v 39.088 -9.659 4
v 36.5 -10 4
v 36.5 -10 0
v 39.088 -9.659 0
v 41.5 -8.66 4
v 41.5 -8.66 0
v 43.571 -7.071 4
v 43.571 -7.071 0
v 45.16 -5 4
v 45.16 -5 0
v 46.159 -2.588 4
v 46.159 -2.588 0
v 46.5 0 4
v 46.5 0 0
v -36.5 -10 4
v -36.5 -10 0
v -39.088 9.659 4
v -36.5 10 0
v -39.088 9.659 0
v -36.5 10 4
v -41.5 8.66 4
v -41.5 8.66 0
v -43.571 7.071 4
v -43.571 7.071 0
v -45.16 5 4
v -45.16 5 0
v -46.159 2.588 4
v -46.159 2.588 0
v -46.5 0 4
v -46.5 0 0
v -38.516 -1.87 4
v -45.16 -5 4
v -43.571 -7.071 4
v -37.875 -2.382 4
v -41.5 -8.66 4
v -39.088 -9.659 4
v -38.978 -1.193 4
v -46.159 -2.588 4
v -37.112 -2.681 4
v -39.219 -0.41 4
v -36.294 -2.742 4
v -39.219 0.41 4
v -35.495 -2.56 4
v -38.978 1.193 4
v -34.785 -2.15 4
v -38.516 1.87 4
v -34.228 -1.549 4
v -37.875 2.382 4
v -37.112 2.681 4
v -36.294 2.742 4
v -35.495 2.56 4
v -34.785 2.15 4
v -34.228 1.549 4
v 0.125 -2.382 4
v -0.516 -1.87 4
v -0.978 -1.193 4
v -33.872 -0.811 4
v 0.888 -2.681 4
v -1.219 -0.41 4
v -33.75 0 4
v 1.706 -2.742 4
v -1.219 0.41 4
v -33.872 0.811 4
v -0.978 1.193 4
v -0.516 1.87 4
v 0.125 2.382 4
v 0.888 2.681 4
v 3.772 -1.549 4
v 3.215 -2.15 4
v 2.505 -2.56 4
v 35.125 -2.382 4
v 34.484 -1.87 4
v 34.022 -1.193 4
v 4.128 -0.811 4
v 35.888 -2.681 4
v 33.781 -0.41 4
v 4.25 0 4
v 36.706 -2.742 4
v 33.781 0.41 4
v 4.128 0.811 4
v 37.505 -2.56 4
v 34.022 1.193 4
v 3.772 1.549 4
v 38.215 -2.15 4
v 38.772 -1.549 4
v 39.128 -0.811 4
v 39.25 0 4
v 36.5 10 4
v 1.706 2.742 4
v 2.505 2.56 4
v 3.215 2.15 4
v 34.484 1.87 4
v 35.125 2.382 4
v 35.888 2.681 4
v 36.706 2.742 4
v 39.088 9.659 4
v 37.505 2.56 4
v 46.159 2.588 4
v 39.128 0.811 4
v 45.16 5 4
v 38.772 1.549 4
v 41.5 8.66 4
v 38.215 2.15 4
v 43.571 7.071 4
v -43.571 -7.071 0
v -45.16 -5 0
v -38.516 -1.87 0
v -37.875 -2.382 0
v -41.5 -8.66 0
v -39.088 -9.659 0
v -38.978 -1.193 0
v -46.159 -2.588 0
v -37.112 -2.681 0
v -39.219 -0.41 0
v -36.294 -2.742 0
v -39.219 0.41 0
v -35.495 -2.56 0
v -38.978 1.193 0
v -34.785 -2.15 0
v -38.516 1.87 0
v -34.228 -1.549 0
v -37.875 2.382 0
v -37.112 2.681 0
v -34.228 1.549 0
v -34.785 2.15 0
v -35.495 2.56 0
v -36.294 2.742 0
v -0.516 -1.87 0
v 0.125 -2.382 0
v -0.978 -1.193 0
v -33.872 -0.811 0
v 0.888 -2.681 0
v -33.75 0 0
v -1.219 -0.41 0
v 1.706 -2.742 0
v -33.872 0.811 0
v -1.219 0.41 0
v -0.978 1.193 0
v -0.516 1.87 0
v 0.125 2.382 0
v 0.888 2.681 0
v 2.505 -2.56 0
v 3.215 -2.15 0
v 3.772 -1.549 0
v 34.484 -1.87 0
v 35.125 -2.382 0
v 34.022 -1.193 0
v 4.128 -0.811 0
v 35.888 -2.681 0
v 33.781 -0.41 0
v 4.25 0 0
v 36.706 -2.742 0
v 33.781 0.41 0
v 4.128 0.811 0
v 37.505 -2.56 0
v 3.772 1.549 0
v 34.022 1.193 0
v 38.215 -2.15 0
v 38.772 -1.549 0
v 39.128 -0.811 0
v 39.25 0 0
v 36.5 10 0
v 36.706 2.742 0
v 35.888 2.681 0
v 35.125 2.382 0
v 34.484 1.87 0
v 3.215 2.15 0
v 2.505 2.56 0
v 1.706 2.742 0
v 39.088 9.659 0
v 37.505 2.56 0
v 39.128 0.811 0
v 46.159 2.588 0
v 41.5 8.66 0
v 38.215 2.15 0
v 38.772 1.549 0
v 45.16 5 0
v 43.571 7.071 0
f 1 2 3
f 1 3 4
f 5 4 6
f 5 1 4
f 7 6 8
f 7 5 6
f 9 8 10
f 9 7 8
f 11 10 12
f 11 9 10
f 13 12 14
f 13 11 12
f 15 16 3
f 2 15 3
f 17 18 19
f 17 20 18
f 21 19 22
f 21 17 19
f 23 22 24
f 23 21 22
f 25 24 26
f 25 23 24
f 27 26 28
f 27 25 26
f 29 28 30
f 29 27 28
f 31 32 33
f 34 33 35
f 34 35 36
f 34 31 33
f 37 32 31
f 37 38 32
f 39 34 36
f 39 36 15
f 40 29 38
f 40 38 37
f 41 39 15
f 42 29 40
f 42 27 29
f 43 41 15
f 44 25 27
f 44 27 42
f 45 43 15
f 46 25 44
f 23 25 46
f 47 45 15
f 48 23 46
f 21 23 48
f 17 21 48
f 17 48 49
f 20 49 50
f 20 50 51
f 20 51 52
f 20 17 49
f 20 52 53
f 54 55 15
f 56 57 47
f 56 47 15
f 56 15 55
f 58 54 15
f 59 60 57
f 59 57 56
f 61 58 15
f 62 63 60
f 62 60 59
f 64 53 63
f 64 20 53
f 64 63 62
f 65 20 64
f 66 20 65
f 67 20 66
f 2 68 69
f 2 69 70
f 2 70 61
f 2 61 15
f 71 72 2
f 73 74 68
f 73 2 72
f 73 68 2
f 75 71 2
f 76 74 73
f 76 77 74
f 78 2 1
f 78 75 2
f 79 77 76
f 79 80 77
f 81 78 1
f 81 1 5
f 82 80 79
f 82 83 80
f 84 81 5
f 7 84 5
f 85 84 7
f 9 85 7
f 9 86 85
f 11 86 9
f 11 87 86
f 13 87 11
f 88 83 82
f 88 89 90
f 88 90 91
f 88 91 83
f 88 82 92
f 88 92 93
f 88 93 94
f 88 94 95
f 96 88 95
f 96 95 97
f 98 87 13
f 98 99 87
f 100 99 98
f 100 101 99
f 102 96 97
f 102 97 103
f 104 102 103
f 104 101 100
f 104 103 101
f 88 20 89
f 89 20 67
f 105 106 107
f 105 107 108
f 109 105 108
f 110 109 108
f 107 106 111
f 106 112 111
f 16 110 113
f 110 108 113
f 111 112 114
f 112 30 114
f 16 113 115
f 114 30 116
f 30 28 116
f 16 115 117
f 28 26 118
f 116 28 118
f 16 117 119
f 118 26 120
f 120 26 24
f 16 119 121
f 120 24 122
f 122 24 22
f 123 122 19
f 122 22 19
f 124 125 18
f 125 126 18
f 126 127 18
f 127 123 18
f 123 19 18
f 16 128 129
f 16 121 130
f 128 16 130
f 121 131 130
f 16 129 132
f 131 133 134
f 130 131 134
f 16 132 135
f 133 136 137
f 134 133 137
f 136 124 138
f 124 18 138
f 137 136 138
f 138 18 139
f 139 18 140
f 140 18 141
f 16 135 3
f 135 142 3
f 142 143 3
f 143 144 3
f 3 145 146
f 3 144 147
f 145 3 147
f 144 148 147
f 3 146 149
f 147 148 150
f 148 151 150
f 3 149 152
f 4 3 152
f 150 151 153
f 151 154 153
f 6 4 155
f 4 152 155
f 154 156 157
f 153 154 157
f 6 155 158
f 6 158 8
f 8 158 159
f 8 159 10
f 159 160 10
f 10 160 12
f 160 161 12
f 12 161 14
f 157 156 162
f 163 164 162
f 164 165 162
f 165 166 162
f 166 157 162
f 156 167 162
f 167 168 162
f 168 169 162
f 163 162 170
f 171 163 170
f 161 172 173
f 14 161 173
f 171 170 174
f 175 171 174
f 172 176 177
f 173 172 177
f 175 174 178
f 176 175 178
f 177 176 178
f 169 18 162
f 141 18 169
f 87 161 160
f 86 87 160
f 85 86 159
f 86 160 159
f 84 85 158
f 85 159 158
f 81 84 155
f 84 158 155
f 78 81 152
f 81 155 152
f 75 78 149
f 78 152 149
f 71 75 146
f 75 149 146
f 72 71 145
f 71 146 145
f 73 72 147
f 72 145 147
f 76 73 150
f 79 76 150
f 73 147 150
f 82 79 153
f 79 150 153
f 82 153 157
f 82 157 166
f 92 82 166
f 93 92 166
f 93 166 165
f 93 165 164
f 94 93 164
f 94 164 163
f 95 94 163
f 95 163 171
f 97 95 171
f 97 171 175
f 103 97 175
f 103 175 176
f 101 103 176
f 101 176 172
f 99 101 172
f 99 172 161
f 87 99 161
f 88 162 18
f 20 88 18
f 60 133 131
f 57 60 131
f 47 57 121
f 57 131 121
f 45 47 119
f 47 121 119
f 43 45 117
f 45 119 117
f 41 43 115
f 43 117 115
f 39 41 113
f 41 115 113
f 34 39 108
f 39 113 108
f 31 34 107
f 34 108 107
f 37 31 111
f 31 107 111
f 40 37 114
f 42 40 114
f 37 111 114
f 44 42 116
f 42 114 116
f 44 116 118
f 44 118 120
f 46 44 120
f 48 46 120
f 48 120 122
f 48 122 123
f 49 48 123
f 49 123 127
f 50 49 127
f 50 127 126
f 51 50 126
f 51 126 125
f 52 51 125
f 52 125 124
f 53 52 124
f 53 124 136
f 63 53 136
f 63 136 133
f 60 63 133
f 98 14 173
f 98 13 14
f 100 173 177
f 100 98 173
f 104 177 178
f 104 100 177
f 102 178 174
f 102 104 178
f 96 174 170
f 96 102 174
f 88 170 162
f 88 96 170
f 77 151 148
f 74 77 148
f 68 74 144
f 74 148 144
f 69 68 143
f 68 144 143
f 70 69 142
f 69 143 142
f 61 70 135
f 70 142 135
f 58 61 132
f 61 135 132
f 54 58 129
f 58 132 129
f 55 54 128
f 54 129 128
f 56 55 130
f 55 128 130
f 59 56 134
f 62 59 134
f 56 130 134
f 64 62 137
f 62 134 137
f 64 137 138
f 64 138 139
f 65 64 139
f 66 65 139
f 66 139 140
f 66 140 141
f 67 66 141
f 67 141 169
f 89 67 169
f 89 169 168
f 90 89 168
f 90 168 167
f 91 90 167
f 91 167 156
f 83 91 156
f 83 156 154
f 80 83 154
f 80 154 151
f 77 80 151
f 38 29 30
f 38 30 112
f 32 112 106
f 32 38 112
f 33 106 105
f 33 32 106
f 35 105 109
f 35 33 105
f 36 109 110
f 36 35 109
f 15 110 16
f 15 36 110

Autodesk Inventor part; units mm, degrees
ref_plane "YZ Plane" through (0, 0, 0) normal (1, 0, 0) x (0, 1, 0)
ref_plane "XZ Plane" through (0, 0, 0) normal (0, 1, 0) x (-1, 0, 0)
ref_plane "XY Plane" through (0, 0, 0) normal (0, 0, 1) x (1, 0, 0)
sketch "Sketch1" plane through (0, 0, 0) normal (0, 0, 1) x (1, 0, 0)
  line L0 (-46.5, -10) -> (46.5, -10)
  line L1 (46.5, -10) -> (46.5, 10)
  line L2 (46.5, 10) -> (-46.5, 10)
  line L3 (-46.5, 10) -> (-46.5, -10)
  line L4 (-46.5, -10) -> (46.5, 10) construction
  line L5 (46.5, -10) -> (-46.5, 10) construction
  line L6 (0, 0) -> (-57.93, 0) construction
  circle A0 centre (-36.5, 0) radius 2.75
  line L7 (0, 0) -> (0, 23.3519) construction
  circle A1 centre (36.5, 0) radius 2.75
  circle A2 centre (1.5, 0) radius 2.75
  dimension "d0" = 93
  dimension "d1" = 20
  dimension "d5" = 5.5
  dimension "d6" = 10
  dimension "d9" = 5.5
  dimension "d11" = 35
extrude "Extrusion1" add sketch "Sketch1" along normal blind 4 contours L3 L2 L1 L0 | A0 | A1 | A2
fillet "Fillet1" radius 10 4 edges at (-46.5, 10, 2) (-46.5, -10, 2) (46.5, 10, 2) (46.5, -10, 2)
extrude "Extrusion2" cut sketch "Sketch1" along normal through all contours A0 | A1 | A2
equation "\"d9\" = d5"
properties part number "encoder_link"
